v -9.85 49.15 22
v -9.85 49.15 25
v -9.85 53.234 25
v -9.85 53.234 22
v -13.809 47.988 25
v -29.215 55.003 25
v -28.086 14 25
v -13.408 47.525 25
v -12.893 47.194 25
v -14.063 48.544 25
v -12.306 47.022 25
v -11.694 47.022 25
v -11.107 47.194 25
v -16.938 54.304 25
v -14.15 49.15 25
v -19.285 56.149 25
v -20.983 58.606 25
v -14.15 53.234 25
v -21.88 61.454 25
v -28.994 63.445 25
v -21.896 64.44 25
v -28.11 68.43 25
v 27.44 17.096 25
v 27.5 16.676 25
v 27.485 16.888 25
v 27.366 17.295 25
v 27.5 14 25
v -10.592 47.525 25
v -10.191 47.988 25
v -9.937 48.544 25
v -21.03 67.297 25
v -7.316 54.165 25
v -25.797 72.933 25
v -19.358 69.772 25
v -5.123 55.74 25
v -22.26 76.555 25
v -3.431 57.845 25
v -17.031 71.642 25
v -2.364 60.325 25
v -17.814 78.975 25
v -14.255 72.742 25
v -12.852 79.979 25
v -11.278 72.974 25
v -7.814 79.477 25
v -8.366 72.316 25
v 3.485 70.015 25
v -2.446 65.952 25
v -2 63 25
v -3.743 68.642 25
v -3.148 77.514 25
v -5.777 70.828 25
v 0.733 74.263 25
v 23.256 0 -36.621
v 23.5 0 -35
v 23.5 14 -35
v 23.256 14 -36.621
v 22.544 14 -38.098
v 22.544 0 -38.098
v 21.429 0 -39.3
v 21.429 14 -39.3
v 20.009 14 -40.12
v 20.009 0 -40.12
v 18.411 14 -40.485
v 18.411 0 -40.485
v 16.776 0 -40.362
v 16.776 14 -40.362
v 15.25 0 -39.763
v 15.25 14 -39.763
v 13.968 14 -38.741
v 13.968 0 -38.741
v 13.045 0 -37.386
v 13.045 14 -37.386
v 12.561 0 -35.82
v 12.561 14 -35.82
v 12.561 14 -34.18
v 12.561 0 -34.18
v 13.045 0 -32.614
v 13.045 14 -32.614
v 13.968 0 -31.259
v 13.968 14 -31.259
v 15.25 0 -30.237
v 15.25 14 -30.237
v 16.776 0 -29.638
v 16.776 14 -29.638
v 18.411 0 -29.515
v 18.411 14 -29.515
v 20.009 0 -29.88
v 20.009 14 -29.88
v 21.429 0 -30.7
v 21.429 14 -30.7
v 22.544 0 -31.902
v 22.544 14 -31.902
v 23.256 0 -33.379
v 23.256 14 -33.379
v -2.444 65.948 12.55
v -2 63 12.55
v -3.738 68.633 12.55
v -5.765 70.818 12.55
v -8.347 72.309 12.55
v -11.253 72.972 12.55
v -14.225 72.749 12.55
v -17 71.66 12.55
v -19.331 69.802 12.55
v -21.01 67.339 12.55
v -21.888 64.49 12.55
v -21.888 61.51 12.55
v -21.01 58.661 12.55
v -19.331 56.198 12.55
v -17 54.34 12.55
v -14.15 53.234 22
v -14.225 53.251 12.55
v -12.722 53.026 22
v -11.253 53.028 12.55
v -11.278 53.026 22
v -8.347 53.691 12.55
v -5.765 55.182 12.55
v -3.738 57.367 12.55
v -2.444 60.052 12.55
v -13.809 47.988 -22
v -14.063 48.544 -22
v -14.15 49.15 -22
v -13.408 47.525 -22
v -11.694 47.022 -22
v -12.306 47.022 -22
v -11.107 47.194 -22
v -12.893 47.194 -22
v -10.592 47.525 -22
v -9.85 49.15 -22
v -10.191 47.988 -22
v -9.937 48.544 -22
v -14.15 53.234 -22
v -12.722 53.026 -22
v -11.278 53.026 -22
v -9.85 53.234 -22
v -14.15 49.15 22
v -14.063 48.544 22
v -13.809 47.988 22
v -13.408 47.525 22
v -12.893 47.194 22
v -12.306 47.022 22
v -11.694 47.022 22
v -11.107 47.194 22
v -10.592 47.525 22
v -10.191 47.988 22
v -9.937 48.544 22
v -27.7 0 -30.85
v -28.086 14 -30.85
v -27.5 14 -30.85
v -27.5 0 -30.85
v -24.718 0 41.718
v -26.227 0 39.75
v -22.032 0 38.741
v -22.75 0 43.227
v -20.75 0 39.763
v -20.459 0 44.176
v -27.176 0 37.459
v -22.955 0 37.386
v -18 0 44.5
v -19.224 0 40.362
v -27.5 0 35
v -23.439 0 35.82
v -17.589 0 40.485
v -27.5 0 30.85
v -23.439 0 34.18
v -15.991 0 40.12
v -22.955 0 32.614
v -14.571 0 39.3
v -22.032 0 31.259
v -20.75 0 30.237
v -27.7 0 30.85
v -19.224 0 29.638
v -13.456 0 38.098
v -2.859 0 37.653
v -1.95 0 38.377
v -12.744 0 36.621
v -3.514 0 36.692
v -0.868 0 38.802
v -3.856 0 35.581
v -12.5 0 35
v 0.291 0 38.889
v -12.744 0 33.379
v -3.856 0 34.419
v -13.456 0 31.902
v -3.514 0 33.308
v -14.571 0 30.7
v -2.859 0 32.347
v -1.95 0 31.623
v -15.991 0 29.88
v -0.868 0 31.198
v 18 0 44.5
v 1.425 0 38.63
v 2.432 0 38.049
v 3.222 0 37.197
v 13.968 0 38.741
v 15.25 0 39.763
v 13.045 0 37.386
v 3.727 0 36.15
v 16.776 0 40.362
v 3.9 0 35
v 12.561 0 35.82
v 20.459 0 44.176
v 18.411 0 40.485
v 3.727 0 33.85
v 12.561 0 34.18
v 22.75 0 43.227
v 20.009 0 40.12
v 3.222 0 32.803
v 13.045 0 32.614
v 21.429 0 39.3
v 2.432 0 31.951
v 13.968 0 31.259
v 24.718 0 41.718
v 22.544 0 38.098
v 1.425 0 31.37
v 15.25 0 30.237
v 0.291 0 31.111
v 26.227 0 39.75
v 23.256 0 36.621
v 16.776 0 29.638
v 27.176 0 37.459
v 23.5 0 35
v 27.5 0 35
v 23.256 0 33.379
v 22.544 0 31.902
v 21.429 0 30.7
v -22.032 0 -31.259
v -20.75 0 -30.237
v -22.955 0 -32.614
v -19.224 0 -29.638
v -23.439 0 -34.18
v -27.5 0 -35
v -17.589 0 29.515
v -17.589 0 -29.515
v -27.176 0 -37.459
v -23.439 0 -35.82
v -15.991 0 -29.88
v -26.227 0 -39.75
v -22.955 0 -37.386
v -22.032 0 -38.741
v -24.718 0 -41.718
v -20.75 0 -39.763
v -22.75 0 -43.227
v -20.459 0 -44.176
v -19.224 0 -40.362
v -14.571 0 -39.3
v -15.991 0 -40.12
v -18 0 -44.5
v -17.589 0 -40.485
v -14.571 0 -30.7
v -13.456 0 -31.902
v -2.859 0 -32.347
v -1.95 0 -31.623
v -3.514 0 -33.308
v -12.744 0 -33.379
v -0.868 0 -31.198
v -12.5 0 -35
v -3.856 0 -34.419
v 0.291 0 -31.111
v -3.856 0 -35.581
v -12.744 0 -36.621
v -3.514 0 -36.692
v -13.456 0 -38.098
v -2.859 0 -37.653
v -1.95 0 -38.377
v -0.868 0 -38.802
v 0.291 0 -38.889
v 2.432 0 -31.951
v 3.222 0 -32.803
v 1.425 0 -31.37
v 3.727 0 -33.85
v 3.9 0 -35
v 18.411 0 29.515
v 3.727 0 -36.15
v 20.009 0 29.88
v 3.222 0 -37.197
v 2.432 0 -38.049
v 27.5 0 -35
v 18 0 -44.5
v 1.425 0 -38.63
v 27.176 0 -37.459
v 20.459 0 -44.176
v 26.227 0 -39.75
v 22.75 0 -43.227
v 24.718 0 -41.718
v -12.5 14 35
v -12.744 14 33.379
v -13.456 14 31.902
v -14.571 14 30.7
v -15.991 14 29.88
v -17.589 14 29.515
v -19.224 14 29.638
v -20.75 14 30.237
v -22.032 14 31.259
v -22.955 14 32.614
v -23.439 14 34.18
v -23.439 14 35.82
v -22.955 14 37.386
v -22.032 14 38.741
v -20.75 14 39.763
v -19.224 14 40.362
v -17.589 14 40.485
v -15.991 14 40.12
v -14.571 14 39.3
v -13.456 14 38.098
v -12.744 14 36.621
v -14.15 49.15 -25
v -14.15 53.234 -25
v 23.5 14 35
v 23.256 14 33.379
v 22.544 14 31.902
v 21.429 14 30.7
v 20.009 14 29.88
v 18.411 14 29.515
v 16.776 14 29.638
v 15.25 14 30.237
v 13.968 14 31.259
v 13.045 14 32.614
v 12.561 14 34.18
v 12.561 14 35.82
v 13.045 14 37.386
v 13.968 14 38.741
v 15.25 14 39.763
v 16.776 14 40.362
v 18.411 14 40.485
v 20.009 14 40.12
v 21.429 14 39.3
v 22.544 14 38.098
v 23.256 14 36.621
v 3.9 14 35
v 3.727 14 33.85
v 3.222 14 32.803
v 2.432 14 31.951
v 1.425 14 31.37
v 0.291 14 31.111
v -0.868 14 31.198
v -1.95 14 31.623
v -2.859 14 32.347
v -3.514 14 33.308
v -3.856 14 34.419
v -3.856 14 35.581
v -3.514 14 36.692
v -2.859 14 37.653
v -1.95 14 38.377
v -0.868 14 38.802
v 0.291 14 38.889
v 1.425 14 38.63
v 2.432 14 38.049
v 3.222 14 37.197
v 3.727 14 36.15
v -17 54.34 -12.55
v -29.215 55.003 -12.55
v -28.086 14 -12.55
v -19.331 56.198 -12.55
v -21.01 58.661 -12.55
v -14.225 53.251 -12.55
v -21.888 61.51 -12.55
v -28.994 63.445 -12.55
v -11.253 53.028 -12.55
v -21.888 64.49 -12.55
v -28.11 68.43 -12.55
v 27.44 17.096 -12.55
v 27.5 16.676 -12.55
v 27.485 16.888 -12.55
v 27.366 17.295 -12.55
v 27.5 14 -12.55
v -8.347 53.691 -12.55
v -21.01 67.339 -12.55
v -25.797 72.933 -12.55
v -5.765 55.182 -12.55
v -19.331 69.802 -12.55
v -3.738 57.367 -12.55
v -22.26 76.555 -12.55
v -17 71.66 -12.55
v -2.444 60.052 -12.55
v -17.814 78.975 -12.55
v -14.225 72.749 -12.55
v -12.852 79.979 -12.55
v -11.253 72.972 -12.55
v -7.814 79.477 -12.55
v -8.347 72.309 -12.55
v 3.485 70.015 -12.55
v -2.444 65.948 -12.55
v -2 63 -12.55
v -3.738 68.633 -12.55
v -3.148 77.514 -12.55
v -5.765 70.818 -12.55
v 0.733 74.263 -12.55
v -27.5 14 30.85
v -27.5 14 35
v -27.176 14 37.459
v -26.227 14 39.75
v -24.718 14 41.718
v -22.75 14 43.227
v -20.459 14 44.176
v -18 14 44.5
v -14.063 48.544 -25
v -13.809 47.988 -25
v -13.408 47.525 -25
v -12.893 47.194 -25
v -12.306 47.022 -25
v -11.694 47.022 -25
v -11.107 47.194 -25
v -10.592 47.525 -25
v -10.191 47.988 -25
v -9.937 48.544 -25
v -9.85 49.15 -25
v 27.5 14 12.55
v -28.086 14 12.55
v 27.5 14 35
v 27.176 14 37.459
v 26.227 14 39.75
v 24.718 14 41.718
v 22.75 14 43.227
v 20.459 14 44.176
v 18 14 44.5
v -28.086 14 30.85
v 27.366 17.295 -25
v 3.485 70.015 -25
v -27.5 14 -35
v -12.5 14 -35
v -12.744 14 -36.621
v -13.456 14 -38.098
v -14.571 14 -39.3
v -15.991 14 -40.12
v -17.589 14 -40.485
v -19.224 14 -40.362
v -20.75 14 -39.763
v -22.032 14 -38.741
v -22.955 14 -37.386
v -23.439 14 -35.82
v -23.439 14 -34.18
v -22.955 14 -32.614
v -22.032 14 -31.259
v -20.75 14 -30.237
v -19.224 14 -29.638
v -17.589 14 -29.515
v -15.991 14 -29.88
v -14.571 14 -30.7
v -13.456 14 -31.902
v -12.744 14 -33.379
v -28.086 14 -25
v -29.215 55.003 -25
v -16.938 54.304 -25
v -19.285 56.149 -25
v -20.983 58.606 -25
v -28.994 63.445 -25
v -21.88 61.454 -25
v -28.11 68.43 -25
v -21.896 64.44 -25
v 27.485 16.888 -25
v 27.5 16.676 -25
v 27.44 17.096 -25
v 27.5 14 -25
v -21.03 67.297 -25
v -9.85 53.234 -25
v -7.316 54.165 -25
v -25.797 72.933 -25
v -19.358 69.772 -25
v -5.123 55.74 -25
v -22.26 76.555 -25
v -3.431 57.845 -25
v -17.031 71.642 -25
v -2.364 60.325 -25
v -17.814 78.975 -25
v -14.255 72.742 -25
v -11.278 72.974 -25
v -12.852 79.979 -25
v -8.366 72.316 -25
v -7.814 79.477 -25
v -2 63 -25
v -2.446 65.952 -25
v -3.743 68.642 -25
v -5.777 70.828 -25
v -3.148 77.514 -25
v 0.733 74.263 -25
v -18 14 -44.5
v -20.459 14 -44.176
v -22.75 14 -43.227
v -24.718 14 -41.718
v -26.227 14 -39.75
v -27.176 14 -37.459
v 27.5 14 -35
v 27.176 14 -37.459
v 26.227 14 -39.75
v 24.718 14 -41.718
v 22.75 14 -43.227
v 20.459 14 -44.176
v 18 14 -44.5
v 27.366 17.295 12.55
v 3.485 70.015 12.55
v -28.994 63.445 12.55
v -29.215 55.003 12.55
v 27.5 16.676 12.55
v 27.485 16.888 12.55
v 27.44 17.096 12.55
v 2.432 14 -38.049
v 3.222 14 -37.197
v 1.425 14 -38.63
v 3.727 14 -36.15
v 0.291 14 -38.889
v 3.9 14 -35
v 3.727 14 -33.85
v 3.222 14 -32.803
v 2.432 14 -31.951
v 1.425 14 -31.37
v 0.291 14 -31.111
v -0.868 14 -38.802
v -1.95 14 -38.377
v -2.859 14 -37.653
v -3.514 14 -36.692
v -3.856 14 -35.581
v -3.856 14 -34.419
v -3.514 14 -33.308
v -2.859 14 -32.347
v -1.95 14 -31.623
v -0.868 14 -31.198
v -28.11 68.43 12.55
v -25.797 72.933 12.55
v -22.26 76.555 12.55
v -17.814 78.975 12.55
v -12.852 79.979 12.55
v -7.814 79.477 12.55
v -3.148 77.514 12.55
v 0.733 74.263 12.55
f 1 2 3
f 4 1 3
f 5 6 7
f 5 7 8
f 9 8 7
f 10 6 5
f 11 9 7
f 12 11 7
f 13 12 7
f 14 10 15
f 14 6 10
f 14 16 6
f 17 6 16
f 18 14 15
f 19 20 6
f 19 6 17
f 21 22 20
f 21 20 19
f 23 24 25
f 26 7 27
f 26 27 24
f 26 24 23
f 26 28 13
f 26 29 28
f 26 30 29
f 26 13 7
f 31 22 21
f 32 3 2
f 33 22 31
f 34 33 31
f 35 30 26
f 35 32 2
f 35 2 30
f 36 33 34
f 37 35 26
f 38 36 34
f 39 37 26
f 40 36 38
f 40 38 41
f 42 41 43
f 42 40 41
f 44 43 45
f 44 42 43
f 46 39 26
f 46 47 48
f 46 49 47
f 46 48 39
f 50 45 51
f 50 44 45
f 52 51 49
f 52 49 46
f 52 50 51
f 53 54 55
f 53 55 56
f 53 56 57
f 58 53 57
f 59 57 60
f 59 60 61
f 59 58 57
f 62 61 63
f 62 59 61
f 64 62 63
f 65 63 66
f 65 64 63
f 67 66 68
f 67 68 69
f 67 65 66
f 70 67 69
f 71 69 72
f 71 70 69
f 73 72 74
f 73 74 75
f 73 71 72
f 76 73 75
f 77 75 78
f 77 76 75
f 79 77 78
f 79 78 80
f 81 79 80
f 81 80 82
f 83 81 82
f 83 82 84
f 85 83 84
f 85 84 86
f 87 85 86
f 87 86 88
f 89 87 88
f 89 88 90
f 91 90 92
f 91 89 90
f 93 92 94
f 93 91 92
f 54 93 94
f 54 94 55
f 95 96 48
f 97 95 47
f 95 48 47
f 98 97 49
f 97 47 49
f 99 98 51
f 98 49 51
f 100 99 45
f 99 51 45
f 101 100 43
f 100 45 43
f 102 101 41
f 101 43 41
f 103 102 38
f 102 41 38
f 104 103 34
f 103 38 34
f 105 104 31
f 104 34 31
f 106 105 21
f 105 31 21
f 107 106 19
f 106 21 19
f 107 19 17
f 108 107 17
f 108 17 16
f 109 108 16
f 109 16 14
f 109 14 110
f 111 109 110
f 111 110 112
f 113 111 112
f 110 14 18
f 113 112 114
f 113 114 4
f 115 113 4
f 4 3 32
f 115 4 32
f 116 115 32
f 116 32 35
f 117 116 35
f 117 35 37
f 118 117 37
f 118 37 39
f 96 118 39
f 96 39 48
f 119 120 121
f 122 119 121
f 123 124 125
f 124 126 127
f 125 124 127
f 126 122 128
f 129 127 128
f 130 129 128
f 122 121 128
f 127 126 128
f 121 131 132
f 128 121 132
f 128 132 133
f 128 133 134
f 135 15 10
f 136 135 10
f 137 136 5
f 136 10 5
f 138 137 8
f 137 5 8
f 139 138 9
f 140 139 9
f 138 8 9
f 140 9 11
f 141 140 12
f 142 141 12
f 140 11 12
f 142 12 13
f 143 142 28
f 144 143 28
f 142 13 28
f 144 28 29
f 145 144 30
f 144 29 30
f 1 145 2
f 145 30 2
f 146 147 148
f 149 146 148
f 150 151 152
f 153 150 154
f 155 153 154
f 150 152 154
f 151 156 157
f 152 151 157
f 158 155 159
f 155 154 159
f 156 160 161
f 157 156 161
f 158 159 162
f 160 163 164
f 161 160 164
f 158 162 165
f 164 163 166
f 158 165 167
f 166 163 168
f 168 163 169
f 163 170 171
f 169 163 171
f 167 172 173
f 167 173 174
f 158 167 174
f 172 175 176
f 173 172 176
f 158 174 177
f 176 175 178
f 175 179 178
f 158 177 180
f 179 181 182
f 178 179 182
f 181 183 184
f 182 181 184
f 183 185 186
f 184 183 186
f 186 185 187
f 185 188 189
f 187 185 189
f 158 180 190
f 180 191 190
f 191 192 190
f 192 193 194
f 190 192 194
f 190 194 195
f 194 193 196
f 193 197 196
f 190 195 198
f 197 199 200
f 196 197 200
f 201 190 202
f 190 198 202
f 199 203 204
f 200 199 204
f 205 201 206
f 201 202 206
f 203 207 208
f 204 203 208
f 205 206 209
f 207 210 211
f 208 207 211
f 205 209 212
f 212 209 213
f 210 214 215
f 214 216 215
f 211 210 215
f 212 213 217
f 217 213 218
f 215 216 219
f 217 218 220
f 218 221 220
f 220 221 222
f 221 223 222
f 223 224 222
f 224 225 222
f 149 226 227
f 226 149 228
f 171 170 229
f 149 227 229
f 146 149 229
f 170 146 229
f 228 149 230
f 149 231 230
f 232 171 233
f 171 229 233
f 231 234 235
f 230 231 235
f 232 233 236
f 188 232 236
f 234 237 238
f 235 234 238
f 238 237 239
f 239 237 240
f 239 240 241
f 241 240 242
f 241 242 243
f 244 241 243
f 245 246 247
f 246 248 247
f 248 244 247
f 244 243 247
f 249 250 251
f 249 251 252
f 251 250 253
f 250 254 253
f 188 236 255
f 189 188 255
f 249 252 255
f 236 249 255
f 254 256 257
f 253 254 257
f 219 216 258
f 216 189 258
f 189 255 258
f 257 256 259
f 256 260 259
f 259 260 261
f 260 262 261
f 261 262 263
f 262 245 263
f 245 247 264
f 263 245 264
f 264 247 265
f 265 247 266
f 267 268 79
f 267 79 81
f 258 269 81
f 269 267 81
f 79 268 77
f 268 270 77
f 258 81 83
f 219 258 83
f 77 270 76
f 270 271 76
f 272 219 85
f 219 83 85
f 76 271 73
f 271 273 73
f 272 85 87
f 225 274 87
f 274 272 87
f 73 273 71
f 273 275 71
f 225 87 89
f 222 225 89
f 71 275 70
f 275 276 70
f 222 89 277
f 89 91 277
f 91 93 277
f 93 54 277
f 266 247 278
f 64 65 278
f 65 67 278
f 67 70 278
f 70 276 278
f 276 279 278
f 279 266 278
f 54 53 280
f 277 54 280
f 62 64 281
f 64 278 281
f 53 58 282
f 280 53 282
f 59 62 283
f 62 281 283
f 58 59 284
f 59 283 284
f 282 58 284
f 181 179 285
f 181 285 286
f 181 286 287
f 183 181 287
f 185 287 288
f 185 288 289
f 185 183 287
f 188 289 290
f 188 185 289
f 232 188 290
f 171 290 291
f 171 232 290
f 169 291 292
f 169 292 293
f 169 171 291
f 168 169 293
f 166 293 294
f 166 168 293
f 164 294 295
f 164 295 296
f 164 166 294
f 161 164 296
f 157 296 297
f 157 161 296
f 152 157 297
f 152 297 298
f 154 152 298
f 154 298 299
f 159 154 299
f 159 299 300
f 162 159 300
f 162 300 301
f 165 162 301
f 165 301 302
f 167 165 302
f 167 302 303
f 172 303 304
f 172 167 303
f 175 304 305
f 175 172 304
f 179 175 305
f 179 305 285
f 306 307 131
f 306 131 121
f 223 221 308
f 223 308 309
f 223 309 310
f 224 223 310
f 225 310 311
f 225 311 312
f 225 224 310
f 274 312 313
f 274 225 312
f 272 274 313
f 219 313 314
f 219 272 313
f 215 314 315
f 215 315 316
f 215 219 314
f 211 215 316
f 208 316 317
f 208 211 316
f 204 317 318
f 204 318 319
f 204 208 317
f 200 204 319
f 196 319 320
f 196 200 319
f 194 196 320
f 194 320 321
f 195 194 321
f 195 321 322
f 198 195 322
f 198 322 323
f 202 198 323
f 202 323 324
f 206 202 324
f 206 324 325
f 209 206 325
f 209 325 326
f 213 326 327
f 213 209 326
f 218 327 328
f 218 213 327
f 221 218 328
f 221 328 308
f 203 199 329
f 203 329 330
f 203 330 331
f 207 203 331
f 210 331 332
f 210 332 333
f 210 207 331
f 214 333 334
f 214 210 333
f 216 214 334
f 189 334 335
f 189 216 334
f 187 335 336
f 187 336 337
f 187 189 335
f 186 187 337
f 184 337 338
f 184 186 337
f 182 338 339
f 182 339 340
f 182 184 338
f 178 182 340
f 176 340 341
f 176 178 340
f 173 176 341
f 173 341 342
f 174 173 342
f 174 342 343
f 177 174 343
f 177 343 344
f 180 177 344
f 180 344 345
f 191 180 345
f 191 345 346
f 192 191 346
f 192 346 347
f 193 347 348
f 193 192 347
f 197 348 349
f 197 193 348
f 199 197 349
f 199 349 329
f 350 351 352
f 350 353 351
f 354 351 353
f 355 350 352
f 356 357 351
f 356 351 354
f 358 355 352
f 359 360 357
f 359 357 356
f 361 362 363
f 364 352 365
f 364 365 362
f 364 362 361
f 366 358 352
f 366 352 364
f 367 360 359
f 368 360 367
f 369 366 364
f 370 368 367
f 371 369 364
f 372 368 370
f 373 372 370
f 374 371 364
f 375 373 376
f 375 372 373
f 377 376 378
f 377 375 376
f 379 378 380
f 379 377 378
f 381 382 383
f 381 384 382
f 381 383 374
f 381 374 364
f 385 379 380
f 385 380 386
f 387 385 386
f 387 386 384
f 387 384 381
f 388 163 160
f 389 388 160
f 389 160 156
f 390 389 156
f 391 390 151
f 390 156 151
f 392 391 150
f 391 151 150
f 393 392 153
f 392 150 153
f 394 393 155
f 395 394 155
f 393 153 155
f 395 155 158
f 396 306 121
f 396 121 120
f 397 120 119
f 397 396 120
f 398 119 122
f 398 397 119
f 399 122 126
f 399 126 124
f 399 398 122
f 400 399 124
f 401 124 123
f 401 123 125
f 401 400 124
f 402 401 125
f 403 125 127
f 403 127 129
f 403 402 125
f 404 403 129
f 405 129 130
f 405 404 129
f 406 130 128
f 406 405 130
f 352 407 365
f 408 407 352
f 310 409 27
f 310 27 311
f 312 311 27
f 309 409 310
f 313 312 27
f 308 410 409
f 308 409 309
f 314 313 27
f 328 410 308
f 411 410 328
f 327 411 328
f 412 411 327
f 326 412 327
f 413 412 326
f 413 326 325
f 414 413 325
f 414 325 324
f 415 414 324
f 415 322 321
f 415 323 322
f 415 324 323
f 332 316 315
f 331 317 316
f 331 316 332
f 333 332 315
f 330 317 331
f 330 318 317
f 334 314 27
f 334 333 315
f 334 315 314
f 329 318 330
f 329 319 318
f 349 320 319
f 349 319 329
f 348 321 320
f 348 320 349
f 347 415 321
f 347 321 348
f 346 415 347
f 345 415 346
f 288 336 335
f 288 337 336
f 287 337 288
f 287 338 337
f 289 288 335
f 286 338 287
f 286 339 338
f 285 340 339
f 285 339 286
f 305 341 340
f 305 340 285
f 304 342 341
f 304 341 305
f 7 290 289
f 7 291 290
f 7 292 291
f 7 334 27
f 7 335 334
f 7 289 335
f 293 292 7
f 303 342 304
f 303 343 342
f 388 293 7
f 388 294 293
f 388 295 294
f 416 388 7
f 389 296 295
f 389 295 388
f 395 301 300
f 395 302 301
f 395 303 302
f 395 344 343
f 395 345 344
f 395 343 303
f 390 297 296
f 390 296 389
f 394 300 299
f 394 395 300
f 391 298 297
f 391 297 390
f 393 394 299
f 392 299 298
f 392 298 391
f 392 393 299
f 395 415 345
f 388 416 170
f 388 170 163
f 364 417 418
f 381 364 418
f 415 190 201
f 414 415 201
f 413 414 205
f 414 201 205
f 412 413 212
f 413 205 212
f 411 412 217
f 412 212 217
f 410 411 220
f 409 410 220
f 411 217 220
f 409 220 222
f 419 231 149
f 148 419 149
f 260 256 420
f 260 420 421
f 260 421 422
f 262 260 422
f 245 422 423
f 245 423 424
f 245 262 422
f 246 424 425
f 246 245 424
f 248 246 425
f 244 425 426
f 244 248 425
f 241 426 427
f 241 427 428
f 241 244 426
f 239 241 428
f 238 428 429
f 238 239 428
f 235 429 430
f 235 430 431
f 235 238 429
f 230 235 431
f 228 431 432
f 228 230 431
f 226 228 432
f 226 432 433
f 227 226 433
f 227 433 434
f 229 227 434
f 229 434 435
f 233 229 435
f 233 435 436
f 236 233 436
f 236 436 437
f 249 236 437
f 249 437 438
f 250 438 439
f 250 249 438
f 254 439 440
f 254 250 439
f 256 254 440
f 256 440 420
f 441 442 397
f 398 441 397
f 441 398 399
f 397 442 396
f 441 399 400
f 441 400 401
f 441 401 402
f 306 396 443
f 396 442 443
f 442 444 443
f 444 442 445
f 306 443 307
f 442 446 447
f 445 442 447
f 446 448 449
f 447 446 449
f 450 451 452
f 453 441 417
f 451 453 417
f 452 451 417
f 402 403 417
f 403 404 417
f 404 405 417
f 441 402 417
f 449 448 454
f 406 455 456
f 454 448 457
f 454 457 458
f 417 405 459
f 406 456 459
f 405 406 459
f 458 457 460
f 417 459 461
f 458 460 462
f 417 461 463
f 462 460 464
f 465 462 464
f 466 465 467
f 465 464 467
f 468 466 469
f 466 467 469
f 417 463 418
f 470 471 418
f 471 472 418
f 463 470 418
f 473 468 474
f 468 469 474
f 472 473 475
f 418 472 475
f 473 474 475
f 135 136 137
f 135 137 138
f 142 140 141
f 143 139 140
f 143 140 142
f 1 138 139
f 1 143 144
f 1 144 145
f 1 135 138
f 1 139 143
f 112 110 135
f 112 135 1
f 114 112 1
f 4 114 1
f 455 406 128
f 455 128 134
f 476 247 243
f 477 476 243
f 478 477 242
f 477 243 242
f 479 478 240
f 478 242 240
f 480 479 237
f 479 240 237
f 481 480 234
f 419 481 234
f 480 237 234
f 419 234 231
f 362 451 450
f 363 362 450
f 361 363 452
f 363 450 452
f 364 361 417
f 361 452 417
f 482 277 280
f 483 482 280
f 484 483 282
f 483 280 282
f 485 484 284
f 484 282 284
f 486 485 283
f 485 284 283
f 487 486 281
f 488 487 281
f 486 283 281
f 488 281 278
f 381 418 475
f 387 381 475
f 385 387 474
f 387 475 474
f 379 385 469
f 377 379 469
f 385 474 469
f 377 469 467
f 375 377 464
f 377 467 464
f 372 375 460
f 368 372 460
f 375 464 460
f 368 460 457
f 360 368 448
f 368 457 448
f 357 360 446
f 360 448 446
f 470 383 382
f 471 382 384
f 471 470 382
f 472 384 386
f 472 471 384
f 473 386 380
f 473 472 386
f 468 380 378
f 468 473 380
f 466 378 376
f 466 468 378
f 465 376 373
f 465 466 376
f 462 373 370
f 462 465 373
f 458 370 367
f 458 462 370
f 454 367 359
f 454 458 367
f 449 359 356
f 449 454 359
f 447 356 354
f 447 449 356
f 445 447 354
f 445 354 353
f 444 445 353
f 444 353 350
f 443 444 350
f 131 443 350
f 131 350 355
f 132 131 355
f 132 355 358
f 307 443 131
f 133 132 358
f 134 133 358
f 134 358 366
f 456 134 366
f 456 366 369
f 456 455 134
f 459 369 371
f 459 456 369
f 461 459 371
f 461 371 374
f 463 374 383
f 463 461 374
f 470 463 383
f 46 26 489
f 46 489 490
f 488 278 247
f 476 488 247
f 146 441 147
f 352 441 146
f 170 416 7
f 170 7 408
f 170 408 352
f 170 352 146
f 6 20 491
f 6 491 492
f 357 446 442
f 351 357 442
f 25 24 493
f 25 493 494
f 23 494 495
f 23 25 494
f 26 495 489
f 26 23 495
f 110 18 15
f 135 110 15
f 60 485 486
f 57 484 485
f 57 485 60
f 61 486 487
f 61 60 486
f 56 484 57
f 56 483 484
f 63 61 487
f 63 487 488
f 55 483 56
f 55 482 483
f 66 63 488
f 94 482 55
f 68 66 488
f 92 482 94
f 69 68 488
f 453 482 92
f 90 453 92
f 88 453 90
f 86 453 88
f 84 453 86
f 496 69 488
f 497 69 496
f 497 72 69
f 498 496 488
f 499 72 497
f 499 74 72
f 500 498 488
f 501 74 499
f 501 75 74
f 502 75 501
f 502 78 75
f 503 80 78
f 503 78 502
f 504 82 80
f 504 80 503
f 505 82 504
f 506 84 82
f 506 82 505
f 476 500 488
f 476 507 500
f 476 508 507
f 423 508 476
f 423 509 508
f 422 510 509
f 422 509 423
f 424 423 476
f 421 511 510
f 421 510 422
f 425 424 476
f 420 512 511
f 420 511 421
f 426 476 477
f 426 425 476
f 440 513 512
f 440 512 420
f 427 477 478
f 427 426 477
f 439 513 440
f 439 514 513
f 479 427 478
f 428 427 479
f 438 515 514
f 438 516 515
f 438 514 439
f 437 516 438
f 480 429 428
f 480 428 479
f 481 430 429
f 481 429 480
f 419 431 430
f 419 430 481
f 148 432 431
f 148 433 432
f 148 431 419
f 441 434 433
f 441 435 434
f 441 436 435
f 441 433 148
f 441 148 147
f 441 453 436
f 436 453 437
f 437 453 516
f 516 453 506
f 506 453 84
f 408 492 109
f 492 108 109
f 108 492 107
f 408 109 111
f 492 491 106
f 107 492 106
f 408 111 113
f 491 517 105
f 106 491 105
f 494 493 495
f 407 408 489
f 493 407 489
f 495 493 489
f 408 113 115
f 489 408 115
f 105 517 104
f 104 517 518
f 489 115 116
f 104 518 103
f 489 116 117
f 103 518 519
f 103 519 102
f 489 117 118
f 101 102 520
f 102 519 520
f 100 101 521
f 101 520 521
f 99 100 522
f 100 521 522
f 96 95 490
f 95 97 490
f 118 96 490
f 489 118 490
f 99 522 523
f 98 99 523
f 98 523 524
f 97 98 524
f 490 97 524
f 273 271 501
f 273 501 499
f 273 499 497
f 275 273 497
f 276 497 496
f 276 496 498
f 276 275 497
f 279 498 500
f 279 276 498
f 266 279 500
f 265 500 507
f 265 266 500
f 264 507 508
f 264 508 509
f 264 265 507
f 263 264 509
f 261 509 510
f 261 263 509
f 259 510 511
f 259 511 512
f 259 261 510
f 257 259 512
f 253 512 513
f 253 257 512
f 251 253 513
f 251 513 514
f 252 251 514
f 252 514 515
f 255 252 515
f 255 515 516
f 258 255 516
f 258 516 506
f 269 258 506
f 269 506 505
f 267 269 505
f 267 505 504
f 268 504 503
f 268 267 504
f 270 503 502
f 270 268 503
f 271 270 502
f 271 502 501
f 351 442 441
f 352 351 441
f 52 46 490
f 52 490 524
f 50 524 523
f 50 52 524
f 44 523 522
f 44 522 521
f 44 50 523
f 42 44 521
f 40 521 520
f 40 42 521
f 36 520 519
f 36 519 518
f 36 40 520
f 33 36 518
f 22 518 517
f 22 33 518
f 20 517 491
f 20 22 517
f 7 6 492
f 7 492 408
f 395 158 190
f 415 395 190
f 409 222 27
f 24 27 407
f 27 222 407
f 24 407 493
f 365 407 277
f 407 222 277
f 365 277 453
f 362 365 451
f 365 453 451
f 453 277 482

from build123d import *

# Parameters (mm, degrees)
SKETCH1_R                = 5.5
SKETCH1_R_2              = 3.9
BOSS_EXTRUDE1_DEPTH      = 14
BOSS_EXTRUDE2_DEPTH      = 30.85
BOSS_EXTRUDE2_DEPTH_BACK = 30.85
SKETCH3_R                = 10
BOSS_EXTRUDE3_DEPTH      = 12.45
SKETCH4_R                = 10
BOSS_EXTRUDE4_DEPTH      = 12.45
CUT_EXTRUDE1_DEPTH       = 3
CUT_EXTRUDE1_DEPTH_BACK  = 3
CUT_EXTRUDE2_DEPTH       = 3
CUT_EXTRUDE2_DEPTH_BACK  = 3


with BuildPart() as part:
    # Sketch1 → Boss-Extrude1 (new body)
    with BuildSketch(Plane(origin=(0, 0, 0), x_dir=(1, 0, 0), z_dir=(0, 1, 0))):
        with BuildLine():
            Line((-18, -44.5), (18, -44.5))
            ThreePointArc((18, -44.5), (24.717514421, -41.717514421), (27.5, -35))
            Line((27.5, -35), (27.5, 35))
            ThreePointArc((27.5, 35), (24.717514421, 41.717514421), (18, 44.5))
            Line((18, 44.5), (-18, 44.5))
            ThreePointArc((-18, 44.5), (-24.717514421, 41.717514421), (-27.5, 35))
            Line((-27.5, 35), (-27.5, -35))
            ThreePointArc((-27.5, -35), (-24.717514421, -41.717514421), (-18, -44.5))
        make_face()
        with Locations((18, 35)):
            Circle(SKETCH1_R, mode=Mode.SUBTRACT)
        with Locations((18, -35)):
            Circle(SKETCH1_R, mode=Mode.SUBTRACT)
        with Locations((0, 35)):
            Circle(SKETCH1_R_2, mode=Mode.SUBTRACT)
        with Locations((0, -35)):
            Circle(SKETCH1_R_2, mode=Mode.SUBTRACT)
        with Locations((-18, 35)):
            Circle(SKETCH1_R, mode=Mode.SUBTRACT)
        with Locations((-18, -35)):
            Circle(SKETCH1_R, mode=Mode.SUBTRACT)
    extrude(amount=BOSS_EXTRUDE1_DEPTH)

    # Sketch2 → Boss-Extrude2 (add, two sides)
    with BuildSketch(Plane.XY) as boss_extrude2_sk:
        Polygon((-28.085675658, 14), (-27.7, 0), (-22.7, 0), (-22.7, 14), align=None)
    extrude(amount=BOSS_EXTRUDE2_DEPTH)
    extrude(boss_extrude2_sk.sketch, amount=-BOSS_EXTRUDE2_DEPTH_BACK)

    # Sketch3 → Boss-Extrude3 (add)
    with BuildSketch(Plane.XY.offset(25)):
        with BuildLine():
            Line((-29.215236642, 55.002986453), (-27.7, 0))
            Line((-27.7, 0), (27.5, 0))
            Line((27.5, 0), (27.5, 16.676103914))
            ThreePointArc((27.5, 16.676103914), (27.466207658, 16.992703195), (27.366353194, 17.295037634))
            Line((27.366353194, 17.295037634), (3.485336194, 70.014582166))
            ThreePointArc((3.485336194, 70.014582166), (-15.37030771, 79.662563606), (-28.994174525, 63.445008121))
            Line((-28.994174525, 63.445008121), (-29.215236642, 55.002986453))
        make_face()
        with Locations((-12, 63)):
            Circle(SKETCH3_R, mode=Mode.SUBTRACT)
    extrude(amount=-BOSS_EXTRUDE3_DEPTH)

    # Sketch4 → Boss-Extrude4 (add)
    with BuildSketch(Plane.XY.offset(-25)):
        with BuildLine():
            Line((-29.215236642, 55.002986453), (-27.7, 0))
            Line((-27.7, 0), (27.5, 0))
            Line((27.5, 0), (27.5, 16.676103914))
            ThreePointArc((27.5, 16.676103914), (27.466207658, 16.992703195), (27.366353194, 17.295037634))
            Line((27.366353194, 17.295037634), (3.485336194, 70.014582166))
            ThreePointArc((3.485336194, 70.014582166), (-15.37030771, 79.662563606), (-28.994174525, 63.445008121))
            Line((-28.994174525, 63.445008121), (-29.215236642, 55.002986453))
        make_face()
        with Locations((-12, 63)):
            Circle(SKETCH4_R, mode=Mode.SUBTRACT)
    extrude(amount=BOSS_EXTRUDE4_DEPTH)

    # Sketch5 → Cut-Extrude1 (cut, two sides)
    with BuildSketch(Plane.XY.offset(25)) as cut_extrude1_sk:
        with BuildLine():
            Line((-9.85, 49.15), (-9.85, 63))
            Line((-9.85, 63), (-14.15, 63))
            Line((-14.15, 63), (-14.15, 49.15))
            ThreePointArc((-14.15, 49.15), (-12, 47), (-9.85, 49.15))
        make_face()
    extrude(amount=CUT_EXTRUDE1_DEPTH, mode=Mode.SUBTRACT)
    extrude(cut_extrude1_sk.sketch, amount=-CUT_EXTRUDE1_DEPTH_BACK, mode=Mode.SUBTRACT)

    # Sketch6 → Cut-Extrude2 (cut, two sides)
    with BuildSketch(Plane.XY.offset(-25)) as cut_extrude2_sk:
        with BuildLine():
            Line((-9.85, 49.15), (-9.85, 63))
            Line((-9.85, 63), (-14.15, 63))
            Line((-14.15, 63), (-14.15, 49.15))
            ThreePointArc((-14.15, 49.15), (-12, 47), (-9.85, 49.15))
        make_face()
    extrude(amount=CUT_EXTRUDE2_DEPTH, mode=Mode.SUBTRACT)
    extrude(cut_extrude2_sk.sketch, amount=-CUT_EXTRUDE2_DEPTH_BACK, mode=Mode.SUBTRACT)


solid = part.part
